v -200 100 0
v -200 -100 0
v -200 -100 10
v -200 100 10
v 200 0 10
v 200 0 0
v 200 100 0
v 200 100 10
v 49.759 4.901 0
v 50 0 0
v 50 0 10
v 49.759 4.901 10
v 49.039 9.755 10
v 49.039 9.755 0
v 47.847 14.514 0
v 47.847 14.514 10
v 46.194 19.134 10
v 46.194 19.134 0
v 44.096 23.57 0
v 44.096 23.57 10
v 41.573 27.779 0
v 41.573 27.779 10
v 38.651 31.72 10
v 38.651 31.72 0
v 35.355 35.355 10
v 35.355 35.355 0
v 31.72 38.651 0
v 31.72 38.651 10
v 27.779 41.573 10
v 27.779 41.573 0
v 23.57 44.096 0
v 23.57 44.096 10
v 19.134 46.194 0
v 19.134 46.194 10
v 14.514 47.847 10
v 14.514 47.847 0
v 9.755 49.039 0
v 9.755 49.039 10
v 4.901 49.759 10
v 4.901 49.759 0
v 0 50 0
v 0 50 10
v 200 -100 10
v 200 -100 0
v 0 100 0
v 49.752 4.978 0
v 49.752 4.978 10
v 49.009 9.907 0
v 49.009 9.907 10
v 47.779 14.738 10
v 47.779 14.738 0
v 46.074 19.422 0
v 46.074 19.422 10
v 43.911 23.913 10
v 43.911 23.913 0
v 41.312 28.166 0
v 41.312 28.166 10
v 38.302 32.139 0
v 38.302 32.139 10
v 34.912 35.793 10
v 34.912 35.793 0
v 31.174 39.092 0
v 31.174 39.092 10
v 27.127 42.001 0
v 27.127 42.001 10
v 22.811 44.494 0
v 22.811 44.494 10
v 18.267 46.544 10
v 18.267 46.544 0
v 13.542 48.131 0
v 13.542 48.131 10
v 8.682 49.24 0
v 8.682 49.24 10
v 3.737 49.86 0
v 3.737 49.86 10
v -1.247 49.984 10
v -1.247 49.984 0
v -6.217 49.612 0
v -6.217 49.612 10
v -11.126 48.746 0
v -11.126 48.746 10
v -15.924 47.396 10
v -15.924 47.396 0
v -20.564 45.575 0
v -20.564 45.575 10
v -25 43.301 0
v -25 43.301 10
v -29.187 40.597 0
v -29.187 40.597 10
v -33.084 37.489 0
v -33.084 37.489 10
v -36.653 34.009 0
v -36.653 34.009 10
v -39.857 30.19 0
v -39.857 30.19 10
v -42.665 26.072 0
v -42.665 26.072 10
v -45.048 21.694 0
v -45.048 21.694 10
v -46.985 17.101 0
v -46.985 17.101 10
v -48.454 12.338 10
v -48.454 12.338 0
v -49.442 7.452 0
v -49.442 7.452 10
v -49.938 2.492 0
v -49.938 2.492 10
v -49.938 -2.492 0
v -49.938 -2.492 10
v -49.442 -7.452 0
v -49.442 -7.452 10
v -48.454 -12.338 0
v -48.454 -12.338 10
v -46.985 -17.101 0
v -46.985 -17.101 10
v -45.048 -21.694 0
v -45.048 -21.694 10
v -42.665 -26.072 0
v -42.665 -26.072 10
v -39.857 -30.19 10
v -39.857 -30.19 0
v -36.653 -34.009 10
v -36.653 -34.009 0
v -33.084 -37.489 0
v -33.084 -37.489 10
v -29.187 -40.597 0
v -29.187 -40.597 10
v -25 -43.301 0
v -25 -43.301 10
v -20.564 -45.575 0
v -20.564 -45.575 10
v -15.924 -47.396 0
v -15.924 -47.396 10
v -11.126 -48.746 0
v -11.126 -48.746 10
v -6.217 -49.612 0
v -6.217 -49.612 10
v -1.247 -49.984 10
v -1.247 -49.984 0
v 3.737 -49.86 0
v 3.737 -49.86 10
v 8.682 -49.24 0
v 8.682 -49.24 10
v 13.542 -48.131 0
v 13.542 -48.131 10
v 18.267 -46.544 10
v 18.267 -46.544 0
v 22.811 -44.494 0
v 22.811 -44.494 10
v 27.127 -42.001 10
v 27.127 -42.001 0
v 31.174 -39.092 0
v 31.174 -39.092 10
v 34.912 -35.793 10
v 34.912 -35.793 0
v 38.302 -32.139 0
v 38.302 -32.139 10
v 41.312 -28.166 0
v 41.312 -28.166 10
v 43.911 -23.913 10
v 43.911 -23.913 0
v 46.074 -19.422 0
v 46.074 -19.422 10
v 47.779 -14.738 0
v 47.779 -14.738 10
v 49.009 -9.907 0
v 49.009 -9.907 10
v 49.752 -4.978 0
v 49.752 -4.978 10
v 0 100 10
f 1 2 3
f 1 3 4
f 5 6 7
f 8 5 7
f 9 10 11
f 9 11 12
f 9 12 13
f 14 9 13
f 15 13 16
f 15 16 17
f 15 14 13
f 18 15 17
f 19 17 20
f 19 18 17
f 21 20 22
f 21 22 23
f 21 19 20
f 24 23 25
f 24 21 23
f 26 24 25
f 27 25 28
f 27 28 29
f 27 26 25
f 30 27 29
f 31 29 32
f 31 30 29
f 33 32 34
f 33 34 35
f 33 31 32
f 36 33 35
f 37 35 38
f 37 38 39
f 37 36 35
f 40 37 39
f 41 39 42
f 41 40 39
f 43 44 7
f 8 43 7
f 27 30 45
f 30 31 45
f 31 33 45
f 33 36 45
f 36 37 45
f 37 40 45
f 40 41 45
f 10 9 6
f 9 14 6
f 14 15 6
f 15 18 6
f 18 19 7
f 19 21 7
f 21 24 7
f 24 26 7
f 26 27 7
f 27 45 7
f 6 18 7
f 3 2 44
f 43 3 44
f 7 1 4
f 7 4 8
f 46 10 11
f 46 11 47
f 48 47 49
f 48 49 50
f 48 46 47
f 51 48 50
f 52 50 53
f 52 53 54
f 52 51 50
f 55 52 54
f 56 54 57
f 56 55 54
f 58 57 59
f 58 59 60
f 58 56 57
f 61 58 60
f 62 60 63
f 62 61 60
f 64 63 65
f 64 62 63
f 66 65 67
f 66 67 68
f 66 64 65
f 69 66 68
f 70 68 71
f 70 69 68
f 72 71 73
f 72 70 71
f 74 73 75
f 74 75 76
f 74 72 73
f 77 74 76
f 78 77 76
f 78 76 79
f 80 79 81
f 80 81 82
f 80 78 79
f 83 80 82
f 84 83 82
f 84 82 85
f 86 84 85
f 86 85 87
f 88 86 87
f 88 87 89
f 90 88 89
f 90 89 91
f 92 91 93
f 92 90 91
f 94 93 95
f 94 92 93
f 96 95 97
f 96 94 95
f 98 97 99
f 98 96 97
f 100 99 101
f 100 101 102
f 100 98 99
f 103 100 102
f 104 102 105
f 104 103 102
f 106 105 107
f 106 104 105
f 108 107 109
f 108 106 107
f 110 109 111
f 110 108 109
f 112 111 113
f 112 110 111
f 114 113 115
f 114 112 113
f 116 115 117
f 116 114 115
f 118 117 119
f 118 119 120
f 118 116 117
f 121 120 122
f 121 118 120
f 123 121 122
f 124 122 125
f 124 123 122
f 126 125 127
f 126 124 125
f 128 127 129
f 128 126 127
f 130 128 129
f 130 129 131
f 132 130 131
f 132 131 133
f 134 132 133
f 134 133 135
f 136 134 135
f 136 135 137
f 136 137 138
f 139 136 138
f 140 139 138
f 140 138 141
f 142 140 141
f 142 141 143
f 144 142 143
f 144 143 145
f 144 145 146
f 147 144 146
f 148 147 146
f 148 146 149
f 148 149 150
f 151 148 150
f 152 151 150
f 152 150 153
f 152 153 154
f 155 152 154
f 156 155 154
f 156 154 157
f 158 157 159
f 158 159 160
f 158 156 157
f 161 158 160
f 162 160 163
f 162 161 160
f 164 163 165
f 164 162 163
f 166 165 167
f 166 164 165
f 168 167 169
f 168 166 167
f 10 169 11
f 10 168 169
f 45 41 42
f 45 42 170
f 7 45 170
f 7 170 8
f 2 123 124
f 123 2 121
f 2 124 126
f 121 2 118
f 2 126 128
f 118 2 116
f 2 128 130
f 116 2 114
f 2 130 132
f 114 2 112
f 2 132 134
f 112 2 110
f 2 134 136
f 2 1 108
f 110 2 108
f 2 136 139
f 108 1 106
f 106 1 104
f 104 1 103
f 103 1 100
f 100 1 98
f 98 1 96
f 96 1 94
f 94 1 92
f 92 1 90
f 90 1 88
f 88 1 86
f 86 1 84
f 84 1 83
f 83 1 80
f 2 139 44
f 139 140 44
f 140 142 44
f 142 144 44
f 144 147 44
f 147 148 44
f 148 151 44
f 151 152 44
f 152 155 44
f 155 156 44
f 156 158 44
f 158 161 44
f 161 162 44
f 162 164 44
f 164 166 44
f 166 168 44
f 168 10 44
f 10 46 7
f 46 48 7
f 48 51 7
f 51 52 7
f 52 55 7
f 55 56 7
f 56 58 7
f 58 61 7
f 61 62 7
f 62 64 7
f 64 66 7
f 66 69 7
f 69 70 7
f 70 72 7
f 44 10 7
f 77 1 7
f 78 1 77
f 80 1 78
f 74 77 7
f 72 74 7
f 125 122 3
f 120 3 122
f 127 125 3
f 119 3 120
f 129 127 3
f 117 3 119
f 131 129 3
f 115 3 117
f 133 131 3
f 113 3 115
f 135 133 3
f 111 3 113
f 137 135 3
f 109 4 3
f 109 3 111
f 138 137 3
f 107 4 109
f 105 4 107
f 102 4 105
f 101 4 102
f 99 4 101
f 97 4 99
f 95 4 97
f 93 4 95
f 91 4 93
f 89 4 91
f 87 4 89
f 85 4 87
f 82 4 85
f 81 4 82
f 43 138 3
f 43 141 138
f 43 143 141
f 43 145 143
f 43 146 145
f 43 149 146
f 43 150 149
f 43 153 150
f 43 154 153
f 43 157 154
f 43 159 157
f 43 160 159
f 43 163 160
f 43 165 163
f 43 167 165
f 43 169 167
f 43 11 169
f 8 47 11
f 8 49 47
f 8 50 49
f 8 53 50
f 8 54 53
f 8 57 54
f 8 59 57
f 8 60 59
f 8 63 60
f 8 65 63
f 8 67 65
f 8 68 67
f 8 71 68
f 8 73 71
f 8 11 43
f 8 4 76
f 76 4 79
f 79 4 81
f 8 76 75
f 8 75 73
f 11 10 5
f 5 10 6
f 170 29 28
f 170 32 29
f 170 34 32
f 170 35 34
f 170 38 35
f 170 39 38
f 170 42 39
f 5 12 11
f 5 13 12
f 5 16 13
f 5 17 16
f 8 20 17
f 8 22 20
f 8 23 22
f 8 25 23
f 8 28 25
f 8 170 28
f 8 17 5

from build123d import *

# Parameters (mm, degrees)
CYLINDER_R        = 50
CYLINDER_DEPTH    = 10
BOX_W             = 200
BOX_H             = 100
BOX_DEPTH         = 10
CYLINDER001_R     = 50
CYLINDER001_DEPTH = 10
BOX001_W          = 400
BOX001_H          = 200
BOX001_DEPTH      = 10


with BuildPart() as cylinder:
    # Cylinder → Cylinder (new body)
    with BuildSketch(Plane.XY):
        Circle(CYLINDER_R)
    extrude(amount=CYLINDER_DEPTH)


with BuildPart() as cut:
    # Box → Box (new body)
    with BuildSketch(Plane.XY):
        with Locations((100, 50)):
            Rectangle(BOX_W, BOX_H)
    extrude(amount=BOX_DEPTH)

    # Cut: cut Cylinder
    add(cylinder.part, mode=Mode.SUBTRACT)


with BuildPart() as cylinder001:
    # Cylinder001 → Cylinder001 (new body)
    with BuildSketch(Plane.XY):
        Circle(CYLINDER001_R)
    extrude(amount=CYLINDER001_DEPTH)


with BuildPart() as cut001:
    # Box001 → Box001 (new body)
    with BuildSketch(Plane(origin=(-200, -100, 0), x_dir=(1, 0, 0), z_dir=(0, 0, 1))):
        with Locations((200, 100)):
            Rectangle(BOX001_W, BOX001_H)
    extrude(amount=BOX001_DEPTH)

    # Cut001: cut Cylinder001
    add(cylinder001.part, mode=Mode.SUBTRACT)


solid = Compound([cut.part, cut001.part])
